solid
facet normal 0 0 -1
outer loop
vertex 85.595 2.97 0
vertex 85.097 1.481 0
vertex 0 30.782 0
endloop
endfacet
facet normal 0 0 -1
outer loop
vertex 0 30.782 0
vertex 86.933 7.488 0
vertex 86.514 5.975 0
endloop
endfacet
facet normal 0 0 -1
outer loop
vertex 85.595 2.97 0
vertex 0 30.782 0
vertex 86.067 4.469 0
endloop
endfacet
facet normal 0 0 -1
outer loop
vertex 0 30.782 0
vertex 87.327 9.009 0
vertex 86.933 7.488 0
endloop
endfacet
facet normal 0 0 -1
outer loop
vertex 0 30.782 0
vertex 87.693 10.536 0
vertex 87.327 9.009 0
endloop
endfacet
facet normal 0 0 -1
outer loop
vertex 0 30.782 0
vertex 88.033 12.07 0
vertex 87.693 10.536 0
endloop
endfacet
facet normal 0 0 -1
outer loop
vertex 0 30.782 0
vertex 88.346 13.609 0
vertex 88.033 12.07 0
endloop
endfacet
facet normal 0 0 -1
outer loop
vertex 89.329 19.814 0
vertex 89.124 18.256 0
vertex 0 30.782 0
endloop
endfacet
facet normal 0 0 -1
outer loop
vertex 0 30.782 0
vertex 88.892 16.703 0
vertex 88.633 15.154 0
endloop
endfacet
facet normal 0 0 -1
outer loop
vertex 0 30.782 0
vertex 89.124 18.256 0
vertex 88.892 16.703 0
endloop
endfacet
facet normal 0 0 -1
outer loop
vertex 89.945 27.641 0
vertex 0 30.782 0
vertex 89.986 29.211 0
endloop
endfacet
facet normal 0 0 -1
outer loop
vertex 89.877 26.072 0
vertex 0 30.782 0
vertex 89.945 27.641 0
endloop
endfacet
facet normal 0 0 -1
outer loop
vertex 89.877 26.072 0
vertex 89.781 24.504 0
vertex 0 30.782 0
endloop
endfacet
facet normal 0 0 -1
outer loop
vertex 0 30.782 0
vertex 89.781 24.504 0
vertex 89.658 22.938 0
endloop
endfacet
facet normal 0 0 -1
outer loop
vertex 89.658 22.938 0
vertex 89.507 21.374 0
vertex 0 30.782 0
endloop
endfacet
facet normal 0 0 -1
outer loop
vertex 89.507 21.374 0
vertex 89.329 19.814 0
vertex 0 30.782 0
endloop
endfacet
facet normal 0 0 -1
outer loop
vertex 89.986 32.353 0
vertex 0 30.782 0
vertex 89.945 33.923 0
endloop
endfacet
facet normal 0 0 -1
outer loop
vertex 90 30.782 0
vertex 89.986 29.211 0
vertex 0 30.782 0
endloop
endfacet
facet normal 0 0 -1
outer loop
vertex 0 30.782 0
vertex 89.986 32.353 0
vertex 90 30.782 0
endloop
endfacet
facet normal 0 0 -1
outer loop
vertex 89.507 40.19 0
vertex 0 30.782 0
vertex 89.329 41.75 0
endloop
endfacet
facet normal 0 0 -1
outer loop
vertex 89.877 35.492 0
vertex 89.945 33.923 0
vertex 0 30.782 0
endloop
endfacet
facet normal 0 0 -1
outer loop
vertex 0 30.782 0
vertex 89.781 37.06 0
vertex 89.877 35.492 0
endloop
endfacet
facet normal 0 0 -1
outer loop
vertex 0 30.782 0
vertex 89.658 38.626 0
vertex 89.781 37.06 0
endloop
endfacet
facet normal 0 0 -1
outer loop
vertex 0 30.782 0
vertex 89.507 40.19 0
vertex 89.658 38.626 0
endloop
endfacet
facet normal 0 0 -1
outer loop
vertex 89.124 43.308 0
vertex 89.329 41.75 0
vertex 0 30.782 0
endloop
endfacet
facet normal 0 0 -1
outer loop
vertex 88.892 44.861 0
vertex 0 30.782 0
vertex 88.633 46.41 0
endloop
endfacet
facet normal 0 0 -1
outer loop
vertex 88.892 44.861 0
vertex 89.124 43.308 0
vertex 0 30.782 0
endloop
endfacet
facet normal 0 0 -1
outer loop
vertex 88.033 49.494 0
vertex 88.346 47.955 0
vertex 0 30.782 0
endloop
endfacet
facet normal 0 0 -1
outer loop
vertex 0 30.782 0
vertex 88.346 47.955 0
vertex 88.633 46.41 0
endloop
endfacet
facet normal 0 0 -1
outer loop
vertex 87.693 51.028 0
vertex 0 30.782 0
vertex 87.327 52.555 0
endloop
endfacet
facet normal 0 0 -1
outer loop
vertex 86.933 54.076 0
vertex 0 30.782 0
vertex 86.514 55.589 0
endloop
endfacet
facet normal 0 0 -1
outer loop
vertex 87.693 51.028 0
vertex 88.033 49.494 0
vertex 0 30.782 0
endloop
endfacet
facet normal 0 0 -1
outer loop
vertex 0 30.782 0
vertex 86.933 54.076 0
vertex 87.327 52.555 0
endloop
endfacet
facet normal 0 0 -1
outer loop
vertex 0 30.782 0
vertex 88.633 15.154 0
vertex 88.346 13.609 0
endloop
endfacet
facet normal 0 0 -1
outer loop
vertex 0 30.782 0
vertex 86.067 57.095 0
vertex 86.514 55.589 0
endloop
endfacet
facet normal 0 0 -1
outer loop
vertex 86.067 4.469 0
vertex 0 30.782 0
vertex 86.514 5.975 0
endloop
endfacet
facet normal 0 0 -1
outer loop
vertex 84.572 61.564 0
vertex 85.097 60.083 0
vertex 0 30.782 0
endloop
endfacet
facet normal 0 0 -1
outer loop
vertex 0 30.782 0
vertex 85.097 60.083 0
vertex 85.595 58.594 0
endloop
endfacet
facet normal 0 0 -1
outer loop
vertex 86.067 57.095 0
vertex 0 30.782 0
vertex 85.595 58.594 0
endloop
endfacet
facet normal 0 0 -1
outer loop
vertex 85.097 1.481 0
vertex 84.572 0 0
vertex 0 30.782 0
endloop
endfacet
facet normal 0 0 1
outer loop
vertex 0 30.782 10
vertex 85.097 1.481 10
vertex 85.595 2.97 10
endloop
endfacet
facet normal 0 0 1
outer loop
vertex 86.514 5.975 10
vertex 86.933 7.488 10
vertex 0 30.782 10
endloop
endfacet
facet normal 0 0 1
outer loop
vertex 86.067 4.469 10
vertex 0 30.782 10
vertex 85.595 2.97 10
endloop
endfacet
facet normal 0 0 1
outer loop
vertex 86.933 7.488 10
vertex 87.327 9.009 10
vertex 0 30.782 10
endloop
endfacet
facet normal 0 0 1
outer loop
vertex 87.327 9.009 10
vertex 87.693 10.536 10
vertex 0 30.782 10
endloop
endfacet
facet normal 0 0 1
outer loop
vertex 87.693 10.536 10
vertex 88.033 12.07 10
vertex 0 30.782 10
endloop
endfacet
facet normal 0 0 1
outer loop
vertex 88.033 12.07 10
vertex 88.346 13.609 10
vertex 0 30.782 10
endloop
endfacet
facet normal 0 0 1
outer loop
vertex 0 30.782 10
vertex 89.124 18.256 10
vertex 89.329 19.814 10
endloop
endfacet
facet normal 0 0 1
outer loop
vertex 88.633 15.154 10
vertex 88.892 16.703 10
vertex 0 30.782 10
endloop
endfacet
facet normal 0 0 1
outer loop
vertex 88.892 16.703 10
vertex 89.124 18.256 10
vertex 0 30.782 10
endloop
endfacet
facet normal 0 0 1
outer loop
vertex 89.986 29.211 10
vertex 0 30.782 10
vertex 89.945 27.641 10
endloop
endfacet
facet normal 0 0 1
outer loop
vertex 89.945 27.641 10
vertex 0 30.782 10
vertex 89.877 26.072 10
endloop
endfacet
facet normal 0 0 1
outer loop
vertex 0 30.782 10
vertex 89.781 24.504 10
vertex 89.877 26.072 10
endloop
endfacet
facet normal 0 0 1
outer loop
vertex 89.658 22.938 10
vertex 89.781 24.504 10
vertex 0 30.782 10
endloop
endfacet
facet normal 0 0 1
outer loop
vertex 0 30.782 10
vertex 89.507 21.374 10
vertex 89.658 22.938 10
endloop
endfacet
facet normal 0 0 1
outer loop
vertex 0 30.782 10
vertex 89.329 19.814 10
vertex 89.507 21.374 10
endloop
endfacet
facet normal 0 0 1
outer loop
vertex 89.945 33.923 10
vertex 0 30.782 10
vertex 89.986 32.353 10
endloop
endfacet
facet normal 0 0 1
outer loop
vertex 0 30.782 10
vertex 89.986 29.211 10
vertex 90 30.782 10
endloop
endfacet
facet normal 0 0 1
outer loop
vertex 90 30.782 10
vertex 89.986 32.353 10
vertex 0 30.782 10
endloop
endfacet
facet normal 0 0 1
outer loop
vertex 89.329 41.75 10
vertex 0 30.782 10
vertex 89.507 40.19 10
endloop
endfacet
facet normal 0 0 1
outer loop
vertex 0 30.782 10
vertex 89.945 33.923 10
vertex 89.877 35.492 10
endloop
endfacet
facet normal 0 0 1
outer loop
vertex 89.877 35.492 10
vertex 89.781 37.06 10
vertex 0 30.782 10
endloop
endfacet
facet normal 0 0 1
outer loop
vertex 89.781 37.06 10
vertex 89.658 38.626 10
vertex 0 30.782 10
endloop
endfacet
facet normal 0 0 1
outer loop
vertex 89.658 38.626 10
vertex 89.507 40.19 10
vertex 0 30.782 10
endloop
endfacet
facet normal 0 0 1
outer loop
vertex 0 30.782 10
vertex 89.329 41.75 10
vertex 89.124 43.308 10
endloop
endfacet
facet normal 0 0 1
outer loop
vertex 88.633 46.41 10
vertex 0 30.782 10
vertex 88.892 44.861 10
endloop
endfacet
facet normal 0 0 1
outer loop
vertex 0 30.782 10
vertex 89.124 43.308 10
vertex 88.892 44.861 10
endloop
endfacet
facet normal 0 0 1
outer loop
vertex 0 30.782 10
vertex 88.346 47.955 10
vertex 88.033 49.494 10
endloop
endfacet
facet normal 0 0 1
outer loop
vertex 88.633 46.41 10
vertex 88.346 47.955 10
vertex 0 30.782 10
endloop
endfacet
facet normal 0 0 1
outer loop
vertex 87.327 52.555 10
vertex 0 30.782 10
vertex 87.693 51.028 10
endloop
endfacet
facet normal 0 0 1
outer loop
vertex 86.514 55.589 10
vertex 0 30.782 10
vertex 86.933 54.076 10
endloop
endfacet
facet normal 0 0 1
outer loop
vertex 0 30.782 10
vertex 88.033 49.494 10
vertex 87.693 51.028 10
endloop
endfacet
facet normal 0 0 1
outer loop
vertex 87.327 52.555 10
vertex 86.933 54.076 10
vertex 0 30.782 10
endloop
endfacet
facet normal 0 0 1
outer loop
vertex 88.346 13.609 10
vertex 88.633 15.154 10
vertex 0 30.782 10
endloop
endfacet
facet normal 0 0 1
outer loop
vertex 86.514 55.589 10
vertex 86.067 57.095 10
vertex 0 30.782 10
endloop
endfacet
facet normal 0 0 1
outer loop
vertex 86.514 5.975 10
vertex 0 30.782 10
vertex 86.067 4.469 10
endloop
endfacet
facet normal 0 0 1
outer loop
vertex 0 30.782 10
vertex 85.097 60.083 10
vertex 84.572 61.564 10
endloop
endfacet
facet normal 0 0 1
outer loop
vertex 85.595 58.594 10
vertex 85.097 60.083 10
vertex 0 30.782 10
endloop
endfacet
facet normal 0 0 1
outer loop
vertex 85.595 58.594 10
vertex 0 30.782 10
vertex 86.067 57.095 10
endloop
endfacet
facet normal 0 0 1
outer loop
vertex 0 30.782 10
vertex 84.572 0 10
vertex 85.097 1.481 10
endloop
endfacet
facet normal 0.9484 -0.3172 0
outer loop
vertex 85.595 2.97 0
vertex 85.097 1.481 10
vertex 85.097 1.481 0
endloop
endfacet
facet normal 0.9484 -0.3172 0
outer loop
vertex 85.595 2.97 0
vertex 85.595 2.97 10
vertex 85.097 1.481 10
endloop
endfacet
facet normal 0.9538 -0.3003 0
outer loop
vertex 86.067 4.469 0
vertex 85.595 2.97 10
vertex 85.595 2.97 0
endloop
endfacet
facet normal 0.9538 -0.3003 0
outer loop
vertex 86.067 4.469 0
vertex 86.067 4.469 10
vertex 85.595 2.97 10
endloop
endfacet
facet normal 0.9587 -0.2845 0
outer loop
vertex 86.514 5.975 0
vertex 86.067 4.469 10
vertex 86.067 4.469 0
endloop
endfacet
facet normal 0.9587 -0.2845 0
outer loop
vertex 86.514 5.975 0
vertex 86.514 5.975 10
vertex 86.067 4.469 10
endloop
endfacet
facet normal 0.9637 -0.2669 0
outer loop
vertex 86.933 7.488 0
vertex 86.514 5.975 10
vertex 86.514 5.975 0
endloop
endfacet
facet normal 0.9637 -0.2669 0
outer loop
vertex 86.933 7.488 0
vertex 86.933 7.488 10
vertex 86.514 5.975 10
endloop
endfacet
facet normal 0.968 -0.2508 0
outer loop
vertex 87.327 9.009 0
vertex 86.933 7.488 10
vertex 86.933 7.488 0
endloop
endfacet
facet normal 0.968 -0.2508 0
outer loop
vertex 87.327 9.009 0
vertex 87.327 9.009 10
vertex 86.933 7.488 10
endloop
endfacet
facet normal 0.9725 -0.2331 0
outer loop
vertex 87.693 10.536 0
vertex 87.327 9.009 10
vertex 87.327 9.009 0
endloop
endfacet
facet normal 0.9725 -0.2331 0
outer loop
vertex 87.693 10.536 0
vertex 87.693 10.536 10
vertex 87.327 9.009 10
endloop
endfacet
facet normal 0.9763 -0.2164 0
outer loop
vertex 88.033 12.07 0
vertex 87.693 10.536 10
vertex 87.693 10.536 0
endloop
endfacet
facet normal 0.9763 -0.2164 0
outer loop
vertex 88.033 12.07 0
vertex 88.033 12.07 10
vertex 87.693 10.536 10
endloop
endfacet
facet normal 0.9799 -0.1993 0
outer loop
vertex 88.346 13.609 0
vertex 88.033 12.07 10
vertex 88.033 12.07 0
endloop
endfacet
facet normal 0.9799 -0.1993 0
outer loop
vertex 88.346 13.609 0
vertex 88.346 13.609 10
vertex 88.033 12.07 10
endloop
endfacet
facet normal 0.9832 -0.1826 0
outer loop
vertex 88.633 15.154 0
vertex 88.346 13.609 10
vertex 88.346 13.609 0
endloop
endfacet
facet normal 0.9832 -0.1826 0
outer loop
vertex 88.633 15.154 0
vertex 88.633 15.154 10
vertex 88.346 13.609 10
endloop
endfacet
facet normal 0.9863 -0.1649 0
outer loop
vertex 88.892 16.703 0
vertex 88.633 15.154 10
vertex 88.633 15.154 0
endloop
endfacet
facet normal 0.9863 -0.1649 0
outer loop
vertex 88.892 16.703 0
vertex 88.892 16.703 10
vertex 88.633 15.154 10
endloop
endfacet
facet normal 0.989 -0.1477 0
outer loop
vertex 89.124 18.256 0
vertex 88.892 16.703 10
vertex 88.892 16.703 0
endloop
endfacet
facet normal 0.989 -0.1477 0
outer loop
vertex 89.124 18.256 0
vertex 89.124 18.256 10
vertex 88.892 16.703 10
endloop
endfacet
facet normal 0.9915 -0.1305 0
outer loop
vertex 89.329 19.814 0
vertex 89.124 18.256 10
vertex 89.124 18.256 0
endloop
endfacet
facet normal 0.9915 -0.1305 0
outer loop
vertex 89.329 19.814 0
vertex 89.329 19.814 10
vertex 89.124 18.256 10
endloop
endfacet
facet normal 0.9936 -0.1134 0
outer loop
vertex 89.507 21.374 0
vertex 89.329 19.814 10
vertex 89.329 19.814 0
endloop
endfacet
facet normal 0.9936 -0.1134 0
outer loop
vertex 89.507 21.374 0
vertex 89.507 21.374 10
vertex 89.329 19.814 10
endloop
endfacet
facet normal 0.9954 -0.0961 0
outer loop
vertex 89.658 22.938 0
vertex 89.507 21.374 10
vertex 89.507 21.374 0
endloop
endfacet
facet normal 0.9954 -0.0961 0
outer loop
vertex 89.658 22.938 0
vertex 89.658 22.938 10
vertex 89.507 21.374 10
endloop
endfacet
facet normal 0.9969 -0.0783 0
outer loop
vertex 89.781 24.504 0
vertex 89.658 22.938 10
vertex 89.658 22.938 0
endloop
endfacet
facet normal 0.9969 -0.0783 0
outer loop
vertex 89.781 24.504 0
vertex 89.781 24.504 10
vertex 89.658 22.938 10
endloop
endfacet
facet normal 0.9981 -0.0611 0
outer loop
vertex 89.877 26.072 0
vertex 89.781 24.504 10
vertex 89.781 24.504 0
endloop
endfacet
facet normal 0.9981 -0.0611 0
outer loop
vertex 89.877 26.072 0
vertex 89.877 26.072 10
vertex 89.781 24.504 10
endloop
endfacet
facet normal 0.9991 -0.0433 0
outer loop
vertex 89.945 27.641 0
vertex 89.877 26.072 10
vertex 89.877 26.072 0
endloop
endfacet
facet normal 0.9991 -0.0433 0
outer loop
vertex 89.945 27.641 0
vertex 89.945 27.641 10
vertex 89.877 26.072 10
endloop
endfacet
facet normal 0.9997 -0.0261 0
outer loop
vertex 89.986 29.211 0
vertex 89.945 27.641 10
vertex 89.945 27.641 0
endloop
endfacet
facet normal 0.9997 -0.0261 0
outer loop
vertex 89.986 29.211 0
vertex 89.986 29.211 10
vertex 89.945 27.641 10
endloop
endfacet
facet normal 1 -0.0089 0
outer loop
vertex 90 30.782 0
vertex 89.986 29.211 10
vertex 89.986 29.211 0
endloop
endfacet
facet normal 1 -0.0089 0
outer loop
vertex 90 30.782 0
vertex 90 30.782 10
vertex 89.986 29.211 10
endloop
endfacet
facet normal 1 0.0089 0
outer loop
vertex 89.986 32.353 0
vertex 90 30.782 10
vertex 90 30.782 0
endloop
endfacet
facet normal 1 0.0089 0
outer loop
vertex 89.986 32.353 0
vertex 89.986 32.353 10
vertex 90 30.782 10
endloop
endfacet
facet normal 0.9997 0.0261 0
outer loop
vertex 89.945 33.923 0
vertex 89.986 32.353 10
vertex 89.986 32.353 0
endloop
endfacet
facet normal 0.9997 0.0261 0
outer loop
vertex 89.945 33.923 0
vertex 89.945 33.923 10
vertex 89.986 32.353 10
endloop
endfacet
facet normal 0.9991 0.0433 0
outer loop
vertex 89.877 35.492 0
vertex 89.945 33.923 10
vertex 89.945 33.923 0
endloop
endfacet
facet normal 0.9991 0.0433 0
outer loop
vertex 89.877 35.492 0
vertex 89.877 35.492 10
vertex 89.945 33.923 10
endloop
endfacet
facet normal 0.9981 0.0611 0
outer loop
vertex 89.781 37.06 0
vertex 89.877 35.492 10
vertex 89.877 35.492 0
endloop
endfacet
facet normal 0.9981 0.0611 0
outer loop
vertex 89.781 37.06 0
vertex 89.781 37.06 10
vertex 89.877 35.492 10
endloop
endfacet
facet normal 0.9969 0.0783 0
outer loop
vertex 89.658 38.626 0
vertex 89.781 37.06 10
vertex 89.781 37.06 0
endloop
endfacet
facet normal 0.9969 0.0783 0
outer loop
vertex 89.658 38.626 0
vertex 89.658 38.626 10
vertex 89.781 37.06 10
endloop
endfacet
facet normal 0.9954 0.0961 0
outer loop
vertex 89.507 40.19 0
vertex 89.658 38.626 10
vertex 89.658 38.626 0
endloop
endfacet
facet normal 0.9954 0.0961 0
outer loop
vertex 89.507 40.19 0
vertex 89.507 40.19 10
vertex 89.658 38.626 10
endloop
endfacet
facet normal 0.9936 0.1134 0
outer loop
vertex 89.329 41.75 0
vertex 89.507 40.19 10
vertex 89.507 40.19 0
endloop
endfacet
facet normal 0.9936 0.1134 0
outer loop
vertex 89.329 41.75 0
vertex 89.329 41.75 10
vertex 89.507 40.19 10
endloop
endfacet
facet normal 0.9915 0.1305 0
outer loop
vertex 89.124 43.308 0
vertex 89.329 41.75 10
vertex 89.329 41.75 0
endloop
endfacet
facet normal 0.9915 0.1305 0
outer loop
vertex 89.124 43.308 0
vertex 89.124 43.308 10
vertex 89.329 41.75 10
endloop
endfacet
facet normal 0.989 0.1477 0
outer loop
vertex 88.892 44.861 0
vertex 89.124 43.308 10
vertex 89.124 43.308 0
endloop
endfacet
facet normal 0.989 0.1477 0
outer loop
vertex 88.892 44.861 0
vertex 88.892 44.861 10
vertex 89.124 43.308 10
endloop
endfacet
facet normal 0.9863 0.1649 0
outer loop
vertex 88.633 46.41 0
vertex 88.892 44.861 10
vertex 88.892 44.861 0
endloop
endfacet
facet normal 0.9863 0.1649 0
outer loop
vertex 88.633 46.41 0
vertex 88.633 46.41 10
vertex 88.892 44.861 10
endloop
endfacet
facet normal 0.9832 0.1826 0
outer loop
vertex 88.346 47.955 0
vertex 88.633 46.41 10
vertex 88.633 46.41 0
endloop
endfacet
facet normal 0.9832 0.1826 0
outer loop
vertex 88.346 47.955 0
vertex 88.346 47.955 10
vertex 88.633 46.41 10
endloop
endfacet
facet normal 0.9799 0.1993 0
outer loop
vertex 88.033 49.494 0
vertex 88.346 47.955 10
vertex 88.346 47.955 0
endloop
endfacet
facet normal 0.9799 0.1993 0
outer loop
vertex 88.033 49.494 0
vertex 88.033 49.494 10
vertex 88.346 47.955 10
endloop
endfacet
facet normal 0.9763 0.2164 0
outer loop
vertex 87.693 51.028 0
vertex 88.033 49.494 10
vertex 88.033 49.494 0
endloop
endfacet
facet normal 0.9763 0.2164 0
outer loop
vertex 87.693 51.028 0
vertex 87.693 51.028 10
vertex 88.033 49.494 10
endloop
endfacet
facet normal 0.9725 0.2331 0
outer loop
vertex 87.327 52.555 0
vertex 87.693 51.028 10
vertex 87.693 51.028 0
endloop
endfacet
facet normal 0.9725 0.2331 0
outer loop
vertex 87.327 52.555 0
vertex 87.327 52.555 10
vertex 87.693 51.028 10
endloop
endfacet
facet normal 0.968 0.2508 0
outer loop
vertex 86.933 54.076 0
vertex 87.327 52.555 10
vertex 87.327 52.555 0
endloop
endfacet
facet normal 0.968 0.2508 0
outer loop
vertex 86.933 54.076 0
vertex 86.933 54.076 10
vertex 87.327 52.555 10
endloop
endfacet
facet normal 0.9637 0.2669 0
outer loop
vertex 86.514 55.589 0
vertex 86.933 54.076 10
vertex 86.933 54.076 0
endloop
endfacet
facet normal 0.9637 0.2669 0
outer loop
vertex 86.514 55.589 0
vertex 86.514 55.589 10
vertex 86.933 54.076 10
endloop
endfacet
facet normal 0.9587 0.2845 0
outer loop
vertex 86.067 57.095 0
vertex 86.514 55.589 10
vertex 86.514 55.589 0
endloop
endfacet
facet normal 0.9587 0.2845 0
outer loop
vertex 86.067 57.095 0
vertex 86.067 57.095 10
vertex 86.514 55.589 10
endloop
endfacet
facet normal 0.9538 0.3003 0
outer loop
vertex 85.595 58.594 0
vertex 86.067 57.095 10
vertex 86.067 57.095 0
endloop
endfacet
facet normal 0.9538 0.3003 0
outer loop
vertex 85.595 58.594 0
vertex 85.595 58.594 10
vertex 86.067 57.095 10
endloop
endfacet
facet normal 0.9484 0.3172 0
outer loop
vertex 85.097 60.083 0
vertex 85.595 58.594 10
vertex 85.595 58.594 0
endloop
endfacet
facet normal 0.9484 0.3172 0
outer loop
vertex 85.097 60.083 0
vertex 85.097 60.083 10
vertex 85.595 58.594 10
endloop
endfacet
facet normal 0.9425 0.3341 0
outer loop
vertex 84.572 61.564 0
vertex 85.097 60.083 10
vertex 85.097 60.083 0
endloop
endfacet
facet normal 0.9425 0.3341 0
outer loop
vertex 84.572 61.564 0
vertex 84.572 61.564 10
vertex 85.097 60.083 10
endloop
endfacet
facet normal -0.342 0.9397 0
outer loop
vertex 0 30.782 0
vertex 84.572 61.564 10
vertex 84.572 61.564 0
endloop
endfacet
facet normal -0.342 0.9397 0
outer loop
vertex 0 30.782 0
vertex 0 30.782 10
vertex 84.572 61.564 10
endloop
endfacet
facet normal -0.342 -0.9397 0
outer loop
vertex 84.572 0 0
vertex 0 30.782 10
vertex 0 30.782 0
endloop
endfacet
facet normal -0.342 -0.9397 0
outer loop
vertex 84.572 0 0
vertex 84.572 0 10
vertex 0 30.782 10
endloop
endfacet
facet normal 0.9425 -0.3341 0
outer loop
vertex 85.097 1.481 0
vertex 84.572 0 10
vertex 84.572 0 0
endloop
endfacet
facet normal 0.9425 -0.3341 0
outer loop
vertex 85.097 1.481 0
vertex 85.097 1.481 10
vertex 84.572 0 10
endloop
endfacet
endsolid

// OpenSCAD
$fn = 32;

// ----------------------------------------------------------------------
// Arc profile plate: sector, 42 points
// ----------------------------------------------------------------------

// --- parameters (mm) ---
sector_angle = 40;        // sector angle, degrees
sector_r = 90;            // outer radius
arc_step = 1;             // sampling step of the arc, degrees
plate_t = 10;             // plate thickness, Z

bbox_x = 2 * sector_r * sin(sector_angle / 2);  // chord of the sector
bbox_y = sector_r;  // depth of the sector (apex to arc)

profile = [[84.572, 0], [85.097, 1.481], [85.595, 2.97], [86.067, 4.469], [86.514, 5.975], [86.933, 7.488], [87.327, 9.009], [87.693, 10.536], [88.033, 12.07], [88.346, 13.609], [88.633, 15.154], [88.892, 16.703], [89.124, 18.256], [89.329, 19.814], [89.507, 21.374], [89.658, 22.938], [89.781, 24.504], [89.877, 26.072], [89.945, 27.641], [89.986, 29.211], [90, 30.782], [89.986, 32.353], [89.945, 33.923], [89.877, 35.492], [89.781, 37.06], [89.658, 38.626], [89.507, 40.19], [89.329, 41.75], [89.124, 43.308], [88.892, 44.861], [88.633, 46.41], [88.346, 47.955], [88.033, 49.494], [87.693, 51.028], [87.327, 52.555], [86.933, 54.076], [86.514, 55.589], [86.067, 57.095], [85.595, 58.594], [85.097, 60.083], [84.572, 61.564], [0, 30.782]];  // primary outline, 42 points, counter clockwise

// --- the one profile operation ---
linear_extrude(height = plate_t) polygon(points = profile);
